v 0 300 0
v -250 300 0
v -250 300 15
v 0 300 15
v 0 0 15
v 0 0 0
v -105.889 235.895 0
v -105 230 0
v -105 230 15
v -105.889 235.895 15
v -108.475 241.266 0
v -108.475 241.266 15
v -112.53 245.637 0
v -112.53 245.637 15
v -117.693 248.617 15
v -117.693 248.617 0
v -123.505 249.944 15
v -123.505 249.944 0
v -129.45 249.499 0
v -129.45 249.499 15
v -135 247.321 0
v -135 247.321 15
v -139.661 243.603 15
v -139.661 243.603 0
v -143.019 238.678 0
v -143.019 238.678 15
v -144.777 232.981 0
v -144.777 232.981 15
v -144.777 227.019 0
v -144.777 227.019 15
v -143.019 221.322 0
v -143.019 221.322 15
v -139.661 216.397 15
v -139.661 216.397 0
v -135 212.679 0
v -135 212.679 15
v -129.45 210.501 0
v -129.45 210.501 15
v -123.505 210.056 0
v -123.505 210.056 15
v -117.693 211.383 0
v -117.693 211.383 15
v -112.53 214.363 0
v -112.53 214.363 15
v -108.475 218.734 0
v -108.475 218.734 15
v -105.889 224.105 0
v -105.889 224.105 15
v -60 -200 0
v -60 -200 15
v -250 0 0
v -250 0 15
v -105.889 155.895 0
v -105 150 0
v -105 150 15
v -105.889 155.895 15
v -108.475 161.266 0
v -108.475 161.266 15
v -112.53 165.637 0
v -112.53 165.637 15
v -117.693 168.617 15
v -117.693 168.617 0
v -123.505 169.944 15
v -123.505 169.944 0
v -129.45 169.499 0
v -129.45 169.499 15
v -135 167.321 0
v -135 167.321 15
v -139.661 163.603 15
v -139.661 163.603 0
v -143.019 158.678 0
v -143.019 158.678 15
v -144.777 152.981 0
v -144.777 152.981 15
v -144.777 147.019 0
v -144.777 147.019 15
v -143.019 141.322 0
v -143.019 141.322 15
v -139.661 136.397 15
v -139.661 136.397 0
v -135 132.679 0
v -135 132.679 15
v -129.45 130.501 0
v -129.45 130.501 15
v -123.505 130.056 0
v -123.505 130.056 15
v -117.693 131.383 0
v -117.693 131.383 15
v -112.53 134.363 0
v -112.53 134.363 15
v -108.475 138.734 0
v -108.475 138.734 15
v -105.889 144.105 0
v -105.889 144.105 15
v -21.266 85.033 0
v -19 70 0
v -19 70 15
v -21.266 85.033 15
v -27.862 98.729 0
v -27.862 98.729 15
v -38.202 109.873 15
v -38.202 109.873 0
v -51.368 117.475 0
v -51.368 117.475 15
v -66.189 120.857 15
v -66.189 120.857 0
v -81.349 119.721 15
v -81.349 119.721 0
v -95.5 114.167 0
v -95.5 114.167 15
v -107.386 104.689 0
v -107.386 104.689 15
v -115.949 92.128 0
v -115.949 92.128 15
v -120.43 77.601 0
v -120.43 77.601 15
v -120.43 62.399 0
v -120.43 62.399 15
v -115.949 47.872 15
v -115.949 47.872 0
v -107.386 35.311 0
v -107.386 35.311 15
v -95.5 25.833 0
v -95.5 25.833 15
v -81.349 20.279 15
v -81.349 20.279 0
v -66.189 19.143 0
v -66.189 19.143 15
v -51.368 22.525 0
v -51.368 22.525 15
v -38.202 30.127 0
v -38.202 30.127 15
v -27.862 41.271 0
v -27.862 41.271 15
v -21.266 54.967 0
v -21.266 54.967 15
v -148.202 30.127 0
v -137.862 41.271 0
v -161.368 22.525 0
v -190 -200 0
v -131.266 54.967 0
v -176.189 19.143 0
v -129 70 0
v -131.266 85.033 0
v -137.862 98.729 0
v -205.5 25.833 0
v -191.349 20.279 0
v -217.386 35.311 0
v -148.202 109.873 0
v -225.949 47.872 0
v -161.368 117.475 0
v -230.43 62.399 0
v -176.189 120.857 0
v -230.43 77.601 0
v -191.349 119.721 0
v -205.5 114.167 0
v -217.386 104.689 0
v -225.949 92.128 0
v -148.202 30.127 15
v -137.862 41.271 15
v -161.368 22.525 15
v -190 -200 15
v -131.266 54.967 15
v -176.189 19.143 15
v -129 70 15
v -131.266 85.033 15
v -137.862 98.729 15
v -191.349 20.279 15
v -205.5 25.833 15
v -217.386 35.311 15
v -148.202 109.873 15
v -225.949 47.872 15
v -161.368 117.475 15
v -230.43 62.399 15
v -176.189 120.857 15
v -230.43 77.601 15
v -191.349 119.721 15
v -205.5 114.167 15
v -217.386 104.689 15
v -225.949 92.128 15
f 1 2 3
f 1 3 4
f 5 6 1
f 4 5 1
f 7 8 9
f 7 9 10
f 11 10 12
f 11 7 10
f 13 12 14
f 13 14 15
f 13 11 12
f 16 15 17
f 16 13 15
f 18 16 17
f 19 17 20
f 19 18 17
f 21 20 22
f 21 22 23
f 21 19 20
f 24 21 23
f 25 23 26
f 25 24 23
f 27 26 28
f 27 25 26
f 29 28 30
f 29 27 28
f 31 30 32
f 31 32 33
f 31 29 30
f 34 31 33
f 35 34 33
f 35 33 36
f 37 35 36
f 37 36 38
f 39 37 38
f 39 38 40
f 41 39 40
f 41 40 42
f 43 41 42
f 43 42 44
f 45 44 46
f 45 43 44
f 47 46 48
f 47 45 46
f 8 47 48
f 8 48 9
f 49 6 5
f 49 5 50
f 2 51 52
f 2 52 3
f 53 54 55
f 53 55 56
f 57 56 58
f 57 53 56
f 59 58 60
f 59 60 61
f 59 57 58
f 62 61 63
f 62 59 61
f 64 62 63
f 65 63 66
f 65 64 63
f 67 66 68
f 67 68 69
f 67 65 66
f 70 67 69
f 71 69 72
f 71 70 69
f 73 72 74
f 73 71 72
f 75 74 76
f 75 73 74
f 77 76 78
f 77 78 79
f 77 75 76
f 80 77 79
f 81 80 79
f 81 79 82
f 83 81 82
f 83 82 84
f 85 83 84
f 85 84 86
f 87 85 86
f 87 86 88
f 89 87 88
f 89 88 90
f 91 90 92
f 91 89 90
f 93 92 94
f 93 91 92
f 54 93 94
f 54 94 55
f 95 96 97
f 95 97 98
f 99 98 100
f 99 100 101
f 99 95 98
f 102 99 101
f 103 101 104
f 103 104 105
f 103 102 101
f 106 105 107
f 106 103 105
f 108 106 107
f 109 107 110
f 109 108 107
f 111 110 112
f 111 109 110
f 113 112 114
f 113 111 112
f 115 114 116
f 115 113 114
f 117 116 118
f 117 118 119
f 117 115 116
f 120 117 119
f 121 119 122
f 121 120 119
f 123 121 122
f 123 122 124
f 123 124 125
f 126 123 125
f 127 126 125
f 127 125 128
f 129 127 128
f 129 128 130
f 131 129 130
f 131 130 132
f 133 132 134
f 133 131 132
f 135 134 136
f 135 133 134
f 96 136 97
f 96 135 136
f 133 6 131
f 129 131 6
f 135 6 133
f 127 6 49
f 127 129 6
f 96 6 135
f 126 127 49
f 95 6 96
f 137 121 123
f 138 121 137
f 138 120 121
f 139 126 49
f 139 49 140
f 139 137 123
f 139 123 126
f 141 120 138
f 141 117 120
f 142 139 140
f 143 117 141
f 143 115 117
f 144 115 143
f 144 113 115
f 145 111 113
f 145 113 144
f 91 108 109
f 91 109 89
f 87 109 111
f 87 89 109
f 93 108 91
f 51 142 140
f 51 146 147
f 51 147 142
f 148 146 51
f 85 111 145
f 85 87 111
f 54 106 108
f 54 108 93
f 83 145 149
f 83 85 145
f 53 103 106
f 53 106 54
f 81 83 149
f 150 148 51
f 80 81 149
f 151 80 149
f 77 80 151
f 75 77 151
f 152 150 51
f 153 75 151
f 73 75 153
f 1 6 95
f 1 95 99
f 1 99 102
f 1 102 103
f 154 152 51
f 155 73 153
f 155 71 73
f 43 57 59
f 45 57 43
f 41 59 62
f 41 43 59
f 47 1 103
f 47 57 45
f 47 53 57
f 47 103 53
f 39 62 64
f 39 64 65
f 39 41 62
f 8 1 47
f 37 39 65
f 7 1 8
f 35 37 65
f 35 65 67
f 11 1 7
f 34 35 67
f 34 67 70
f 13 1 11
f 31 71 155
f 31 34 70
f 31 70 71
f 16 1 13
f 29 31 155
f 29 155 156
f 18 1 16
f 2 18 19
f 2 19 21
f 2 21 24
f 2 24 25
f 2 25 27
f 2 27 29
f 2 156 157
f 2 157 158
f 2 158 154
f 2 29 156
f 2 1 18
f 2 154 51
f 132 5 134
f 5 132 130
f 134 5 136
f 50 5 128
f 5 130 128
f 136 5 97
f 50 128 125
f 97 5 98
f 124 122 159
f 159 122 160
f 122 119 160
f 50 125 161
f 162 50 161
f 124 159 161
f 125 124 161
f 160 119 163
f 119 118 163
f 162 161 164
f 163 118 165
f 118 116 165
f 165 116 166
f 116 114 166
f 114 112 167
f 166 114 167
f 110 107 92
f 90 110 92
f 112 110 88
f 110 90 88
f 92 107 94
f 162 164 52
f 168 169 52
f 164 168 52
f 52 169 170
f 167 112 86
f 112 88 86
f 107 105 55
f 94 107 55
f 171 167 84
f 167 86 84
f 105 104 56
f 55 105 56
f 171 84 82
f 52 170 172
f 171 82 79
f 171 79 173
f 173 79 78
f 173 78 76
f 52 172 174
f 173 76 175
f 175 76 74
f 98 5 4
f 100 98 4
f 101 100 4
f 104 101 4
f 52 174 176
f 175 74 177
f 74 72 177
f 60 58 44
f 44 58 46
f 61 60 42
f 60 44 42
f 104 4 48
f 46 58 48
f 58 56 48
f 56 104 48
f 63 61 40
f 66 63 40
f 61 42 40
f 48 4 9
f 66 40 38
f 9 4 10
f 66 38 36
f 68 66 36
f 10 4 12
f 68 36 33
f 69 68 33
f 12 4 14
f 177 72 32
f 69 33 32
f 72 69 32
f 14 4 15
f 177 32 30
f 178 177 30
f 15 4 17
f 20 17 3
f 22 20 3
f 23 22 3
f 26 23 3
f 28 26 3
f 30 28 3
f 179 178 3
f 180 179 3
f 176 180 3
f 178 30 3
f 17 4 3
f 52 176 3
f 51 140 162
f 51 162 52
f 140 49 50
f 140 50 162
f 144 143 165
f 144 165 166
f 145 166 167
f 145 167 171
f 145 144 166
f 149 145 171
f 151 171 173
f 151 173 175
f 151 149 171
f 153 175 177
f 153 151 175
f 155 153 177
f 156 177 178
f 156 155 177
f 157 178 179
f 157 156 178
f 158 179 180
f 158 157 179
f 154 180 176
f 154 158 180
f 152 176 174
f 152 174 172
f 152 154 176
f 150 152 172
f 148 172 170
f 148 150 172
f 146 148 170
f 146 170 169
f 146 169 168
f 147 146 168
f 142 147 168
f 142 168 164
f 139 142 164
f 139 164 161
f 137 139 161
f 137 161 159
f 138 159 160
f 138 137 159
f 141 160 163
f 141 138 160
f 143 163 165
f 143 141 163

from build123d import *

# Parameters (mm, degrees)
SKETCH1_W           = 250
SKETCH1_H           = 300
SKETCH1_R           = 20
SKETCH1_R_2         = 51
BOSS_EXTRUDE1_DEPTH = 15
BOSS_EXTRUDE2_DEPTH = 15


with BuildPart() as part:
    # Sketch1 → Boss-Extrude1 (new body)
    with BuildSketch(Plane.XY):
        with Locations((-125, 150)):
            Rectangle(SKETCH1_W, SKETCH1_H)
        with Locations((-125, 230)):
            Circle(SKETCH1_R, mode=Mode.SUBTRACT)
        with Locations((-125, 150)):
            Circle(SKETCH1_R, mode=Mode.SUBTRACT)
        with Locations((-180, 70)):
            Circle(SKETCH1_R_2, mode=Mode.SUBTRACT)
        with Locations((-70, 70)):
            Circle(SKETCH1_R_2, mode=Mode.SUBTRACT)
    extrude(amount=BOSS_EXTRUDE1_DEPTH)

    # Sketch2 → Boss-Extrude2 (add)
    with BuildSketch(Plane.XY):
        Polygon((-190, 0), (-60, 0), (0, 0), (-60, -200), (-190, -200), (-250, 0), align=None)
    extrude(amount=BOSS_EXTRUDE2_DEPTH)


solid = part.part
